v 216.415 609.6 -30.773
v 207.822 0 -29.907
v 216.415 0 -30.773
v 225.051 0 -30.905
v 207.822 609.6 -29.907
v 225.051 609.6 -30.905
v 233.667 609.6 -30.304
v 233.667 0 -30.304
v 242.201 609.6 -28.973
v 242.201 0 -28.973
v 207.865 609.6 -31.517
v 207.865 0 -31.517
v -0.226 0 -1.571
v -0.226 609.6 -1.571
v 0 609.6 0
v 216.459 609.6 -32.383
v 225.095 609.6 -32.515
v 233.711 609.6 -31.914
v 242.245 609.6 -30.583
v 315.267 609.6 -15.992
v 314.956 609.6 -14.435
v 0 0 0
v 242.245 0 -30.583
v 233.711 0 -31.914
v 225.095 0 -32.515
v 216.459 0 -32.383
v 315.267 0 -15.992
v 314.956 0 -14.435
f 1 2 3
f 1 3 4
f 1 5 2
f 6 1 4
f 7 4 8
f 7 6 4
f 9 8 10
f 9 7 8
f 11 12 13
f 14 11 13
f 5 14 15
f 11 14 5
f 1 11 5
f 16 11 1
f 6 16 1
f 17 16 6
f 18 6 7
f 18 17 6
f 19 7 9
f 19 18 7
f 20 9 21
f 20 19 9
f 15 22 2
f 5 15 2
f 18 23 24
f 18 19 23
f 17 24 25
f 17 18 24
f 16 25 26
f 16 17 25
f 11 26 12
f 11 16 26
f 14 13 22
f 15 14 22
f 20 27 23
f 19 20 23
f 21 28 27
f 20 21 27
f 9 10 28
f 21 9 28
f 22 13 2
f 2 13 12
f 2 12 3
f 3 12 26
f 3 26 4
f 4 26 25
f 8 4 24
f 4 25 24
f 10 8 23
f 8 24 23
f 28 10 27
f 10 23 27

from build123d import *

# Parameters (mm, degrees)
FORCAD_DEPTH = 609.6
FILLET1_R    = 101.6


with BuildPart() as part:
    # Sketch1 → ForCAD (new body)
    with BuildSketch(Plane(origin=(0, 0, 0), x_dir=(1, 0, 0), z_dir=(0, 1, 0))):
        Polygon((0, 0), (225.091665708, 32.392093885), (314.955840223, 14.435459902), (315.266904727, 15.992185673), (225.135389647, 34.002239572), (-0.226121766, 1.571313208), align=None)
    extrude(amount=FORCAD_DEPTH)

    # Fillet1
    fillet1_edges = [part.edges().sort_by_distance(p)[0] for p in [
        (225.135389647, 304.8, -34.002239572),
        (225.091665708, 304.8, -32.392093885),
    ]]
    fillet(fillet1_edges, radius=FILLET1_R)


solid = part.part
